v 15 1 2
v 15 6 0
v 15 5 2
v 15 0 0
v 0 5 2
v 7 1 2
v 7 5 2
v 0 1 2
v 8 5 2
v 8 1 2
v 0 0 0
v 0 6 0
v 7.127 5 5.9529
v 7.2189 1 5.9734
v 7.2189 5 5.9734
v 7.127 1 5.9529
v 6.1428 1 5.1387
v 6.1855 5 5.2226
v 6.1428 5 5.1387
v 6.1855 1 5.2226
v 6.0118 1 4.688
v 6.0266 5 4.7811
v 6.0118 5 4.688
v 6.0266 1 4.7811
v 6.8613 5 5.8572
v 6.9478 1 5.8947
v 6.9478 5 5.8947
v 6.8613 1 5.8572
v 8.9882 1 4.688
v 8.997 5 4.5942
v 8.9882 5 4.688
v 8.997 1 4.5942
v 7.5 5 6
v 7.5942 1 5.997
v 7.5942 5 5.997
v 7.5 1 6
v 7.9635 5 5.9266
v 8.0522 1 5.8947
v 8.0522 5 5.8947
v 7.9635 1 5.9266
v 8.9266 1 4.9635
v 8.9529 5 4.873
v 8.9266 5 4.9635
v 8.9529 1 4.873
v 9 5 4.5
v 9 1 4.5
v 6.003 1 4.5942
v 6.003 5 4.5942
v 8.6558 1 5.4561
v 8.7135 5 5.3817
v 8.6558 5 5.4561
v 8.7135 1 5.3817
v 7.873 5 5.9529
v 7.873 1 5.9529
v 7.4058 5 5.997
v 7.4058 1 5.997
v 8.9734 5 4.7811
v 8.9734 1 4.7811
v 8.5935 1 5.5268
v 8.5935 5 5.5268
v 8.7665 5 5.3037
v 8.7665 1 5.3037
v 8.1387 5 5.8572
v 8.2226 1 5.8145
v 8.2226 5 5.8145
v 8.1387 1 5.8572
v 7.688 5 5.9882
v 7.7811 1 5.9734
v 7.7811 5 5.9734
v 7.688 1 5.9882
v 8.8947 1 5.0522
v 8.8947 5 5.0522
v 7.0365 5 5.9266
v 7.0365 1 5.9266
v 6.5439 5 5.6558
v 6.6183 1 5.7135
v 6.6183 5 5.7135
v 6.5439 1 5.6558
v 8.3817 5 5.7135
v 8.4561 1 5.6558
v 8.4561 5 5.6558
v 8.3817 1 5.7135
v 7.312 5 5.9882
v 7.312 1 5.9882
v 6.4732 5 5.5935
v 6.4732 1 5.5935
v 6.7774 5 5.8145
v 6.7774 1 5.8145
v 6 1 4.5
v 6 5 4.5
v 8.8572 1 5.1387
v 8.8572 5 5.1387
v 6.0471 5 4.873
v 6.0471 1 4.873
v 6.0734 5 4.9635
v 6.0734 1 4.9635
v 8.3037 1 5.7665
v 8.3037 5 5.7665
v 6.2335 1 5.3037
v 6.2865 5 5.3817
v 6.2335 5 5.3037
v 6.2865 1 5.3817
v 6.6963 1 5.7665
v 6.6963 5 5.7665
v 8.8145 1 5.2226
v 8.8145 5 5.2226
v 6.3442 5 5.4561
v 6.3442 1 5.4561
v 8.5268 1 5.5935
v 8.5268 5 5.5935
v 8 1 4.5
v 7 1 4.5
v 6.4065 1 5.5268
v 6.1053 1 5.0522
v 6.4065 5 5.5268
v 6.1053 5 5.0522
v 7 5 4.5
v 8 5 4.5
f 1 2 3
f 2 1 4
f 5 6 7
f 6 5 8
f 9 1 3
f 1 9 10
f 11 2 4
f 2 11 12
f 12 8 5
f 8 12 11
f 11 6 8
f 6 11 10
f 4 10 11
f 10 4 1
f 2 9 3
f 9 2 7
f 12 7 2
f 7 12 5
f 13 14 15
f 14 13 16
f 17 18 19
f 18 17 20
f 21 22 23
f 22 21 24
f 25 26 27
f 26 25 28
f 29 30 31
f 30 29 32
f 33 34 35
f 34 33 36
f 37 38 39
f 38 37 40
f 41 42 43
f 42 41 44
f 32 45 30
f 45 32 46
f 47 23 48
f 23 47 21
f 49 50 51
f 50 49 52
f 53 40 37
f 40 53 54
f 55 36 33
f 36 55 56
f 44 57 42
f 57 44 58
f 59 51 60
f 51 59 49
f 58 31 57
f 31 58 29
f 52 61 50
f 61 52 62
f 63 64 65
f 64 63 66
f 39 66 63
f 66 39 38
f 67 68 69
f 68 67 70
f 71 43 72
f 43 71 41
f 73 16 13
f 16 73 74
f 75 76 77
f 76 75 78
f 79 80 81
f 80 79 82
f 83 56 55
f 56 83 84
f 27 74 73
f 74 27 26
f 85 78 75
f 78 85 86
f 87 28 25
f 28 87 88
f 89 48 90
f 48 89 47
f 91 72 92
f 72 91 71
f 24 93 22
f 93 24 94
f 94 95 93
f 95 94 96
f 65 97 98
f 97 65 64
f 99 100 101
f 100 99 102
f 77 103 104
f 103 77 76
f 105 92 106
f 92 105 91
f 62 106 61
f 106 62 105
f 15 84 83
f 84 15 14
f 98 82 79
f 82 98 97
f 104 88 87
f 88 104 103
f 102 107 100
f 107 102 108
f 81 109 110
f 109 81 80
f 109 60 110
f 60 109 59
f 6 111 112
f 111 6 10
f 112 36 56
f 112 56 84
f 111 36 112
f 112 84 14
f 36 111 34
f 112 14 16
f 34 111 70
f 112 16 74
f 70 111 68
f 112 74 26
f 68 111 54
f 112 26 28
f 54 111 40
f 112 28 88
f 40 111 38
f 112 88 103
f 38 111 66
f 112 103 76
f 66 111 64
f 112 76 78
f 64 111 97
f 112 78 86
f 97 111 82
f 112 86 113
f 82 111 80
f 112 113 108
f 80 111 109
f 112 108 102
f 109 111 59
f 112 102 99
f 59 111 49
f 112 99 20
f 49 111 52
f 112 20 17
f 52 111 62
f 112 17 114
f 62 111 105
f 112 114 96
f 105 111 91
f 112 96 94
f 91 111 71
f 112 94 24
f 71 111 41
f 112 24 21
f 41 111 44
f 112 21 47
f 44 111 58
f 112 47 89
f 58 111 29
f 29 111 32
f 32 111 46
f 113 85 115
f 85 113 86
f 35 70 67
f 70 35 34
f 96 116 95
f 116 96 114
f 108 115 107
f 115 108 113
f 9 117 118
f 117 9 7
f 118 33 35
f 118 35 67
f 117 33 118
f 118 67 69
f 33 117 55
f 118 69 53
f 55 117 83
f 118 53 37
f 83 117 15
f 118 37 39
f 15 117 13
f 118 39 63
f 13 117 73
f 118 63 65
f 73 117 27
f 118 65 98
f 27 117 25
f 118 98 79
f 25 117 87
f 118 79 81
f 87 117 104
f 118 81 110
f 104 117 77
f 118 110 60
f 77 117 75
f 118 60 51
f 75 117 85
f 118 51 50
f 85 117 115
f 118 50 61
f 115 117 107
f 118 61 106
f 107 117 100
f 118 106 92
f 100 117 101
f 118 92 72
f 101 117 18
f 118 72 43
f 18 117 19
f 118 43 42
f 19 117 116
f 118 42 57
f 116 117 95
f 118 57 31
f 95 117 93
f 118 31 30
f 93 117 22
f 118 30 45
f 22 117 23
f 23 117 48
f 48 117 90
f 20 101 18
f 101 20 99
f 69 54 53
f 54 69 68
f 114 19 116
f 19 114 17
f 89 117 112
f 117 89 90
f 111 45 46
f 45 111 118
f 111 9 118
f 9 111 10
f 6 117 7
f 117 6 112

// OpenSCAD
echo(version=version());
// Increase the visual detail
$fn = 100;

// Marker type
MarkerType = 3;

// Marker height
MarkerH = 2.5;

// Mainbox

module mainbox() {
    translate([0, 1, 0])
    cube([15,4,2]);
           
    rotate([90,0,90])
    linear_extrude(15)
    polygon([[0,0],[2,0],[1,2]]);

    translate([0, 4, 0])
    rotate([90,0,90])
    linear_extrude(15)
    polygon([[0,0],[2,0],[1,2]]);
}


// Markers

module marker() {
    color("red")
    translate([7, 5, 2])
    rotate([90,0,0])
    linear_extrude(4)
    polygon([[0,0],[1,0],[0.5,MarkerH]]);
}

module marker2() {
    color("red")
    translate([7, 1, 2])
    cube([1,4,MarkerH]);
}

module marker3() {
    color("red")
    translate([7, 1, 2])
    cube([1,4,MarkerH]);
    
    difference() {   
        translate([7.5, 5, MarkerH + 2])
        rotate([90,0,0])
        cylinder(d=3, h=4);
        
        color("blue")
        translate([5.5, 0.5, MarkerH + 0.5])
        cube([4,5,1.5]);
    }
    
}



// Modules

mainbox();

if(MarkerType == 1) {
marker();
}

if(MarkerType == 2) {
marker2();
}

if(MarkerType == 3) {
marker3();
}
